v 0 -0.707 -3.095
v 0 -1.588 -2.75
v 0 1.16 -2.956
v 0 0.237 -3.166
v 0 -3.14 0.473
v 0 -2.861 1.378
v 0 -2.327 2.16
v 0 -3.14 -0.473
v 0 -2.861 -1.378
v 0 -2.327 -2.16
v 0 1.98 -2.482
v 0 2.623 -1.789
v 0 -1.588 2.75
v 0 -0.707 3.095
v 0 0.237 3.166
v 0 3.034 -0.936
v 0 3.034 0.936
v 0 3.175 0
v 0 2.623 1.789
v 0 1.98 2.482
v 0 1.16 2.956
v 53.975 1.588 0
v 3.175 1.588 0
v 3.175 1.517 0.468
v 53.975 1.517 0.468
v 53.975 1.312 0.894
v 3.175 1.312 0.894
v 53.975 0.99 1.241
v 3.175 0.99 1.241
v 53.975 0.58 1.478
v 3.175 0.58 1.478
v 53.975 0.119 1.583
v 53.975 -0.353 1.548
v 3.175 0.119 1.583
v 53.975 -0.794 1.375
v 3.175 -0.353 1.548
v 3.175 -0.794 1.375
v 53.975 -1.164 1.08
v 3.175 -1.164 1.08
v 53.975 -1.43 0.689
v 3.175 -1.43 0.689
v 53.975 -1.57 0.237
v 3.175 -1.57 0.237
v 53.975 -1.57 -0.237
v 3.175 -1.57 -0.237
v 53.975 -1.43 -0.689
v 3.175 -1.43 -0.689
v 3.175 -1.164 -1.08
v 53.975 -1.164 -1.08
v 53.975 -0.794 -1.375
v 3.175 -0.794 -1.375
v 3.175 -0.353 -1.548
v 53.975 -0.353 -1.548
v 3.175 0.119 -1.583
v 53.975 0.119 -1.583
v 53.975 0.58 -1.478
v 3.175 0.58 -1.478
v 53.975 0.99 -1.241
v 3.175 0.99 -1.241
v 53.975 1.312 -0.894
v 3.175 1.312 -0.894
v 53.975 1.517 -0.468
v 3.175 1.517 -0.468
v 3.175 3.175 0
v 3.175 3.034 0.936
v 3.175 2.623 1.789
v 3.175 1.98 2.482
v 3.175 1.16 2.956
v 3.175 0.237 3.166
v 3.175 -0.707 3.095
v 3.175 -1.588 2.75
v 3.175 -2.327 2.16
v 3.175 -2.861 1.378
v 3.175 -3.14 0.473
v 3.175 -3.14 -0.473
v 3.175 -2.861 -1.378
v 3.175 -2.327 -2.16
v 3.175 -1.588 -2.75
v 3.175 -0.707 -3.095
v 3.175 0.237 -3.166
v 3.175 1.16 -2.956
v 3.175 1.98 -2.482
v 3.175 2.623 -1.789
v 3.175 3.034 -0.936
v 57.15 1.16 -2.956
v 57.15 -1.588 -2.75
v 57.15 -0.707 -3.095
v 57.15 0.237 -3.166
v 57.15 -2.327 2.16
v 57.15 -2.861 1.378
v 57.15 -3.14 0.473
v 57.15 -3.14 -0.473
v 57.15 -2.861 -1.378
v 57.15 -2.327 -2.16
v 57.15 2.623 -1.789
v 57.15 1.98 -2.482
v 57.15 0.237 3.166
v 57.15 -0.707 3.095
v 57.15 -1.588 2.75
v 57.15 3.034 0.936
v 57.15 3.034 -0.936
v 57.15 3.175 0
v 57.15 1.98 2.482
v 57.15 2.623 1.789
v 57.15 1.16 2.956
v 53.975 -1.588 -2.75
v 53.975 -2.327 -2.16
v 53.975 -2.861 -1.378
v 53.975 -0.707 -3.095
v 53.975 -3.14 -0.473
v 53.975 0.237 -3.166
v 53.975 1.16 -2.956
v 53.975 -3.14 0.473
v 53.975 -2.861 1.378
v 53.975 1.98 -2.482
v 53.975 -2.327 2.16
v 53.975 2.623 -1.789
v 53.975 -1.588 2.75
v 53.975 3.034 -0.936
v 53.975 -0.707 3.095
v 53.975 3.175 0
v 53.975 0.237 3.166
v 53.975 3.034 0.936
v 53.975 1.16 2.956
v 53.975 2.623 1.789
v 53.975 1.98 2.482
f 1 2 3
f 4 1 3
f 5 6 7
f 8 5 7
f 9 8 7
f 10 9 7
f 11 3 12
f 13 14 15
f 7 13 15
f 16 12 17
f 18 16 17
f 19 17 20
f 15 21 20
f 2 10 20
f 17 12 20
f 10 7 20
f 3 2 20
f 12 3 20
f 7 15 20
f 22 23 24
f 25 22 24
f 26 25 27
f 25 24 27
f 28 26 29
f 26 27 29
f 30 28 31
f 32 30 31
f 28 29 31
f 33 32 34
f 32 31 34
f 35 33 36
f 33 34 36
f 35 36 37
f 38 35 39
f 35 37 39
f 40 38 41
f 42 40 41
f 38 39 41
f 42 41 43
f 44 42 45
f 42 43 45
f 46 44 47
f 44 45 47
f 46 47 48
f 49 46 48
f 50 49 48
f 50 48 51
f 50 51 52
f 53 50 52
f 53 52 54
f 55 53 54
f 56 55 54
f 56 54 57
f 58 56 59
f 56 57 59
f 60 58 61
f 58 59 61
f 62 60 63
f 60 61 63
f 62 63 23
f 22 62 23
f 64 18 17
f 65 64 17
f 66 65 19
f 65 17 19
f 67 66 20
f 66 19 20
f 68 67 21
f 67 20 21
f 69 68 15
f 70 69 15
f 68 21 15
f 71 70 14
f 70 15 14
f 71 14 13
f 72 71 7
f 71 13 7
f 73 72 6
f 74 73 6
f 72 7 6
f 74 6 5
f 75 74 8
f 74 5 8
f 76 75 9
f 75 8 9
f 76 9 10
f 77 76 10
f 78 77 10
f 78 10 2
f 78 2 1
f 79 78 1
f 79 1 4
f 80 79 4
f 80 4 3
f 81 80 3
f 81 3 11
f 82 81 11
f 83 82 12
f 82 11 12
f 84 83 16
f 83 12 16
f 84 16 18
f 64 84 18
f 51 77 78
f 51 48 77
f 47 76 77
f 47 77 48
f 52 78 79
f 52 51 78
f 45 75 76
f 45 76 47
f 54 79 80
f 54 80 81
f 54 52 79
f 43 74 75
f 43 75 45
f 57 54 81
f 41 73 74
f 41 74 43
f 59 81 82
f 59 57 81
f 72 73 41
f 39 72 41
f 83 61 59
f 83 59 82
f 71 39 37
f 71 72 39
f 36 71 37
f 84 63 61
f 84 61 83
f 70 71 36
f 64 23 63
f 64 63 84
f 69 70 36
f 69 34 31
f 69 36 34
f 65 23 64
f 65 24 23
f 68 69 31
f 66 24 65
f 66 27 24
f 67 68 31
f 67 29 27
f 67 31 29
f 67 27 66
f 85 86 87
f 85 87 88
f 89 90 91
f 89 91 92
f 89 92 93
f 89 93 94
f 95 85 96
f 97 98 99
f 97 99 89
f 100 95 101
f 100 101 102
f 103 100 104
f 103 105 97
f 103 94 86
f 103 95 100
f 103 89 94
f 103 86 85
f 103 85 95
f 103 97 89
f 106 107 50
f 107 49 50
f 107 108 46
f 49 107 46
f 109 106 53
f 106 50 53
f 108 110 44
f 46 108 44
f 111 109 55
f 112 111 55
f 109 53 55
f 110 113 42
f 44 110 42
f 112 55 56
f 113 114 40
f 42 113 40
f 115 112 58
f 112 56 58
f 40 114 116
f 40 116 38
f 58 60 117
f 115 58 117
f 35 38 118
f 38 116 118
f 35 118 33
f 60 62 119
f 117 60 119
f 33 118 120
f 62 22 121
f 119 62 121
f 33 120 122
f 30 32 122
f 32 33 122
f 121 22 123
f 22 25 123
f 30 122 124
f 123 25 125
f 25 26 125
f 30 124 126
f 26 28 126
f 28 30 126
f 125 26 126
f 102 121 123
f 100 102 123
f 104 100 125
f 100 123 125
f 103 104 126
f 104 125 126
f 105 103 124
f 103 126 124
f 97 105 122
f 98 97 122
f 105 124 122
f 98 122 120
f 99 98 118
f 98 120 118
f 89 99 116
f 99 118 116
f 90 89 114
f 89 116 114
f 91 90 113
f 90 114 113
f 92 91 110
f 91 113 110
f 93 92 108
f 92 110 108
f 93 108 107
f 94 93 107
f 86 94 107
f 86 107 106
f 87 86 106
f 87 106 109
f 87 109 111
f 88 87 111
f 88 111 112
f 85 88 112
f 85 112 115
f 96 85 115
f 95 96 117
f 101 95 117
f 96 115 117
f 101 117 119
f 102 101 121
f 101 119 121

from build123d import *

# Parameters (mm, degrees)
F0_R     = 3.175
F1_DEPTH = 3.175
F2_R     = 1.5875
F3_DEPTH = 50.8
F4_R     = 3.175
F4_R_2   = 1.5875
F5_DEPTH = 3.175


with BuildPart() as f1:
    # F0 (on Right) → F1 (new body)
    with BuildSketch(Plane.YZ):
        Circle(F0_R)
    extrude(amount=F1_DEPTH)

    # F2 (on face) → F3 (join)
    with BuildSketch(Plane.YZ.offset(3.175)):
        Circle(F2_R)
    extrude(amount=F3_DEPTH)

    # F4 (on face) → F5 (join)
    with BuildSketch(Plane.YZ.offset(53.975)):
        Circle(F4_R)
        Circle(F4_R_2, mode=Mode.SUBTRACT)
        Circle(F4_R_2)
    extrude(amount=F5_DEPTH)


solid = f1.part
